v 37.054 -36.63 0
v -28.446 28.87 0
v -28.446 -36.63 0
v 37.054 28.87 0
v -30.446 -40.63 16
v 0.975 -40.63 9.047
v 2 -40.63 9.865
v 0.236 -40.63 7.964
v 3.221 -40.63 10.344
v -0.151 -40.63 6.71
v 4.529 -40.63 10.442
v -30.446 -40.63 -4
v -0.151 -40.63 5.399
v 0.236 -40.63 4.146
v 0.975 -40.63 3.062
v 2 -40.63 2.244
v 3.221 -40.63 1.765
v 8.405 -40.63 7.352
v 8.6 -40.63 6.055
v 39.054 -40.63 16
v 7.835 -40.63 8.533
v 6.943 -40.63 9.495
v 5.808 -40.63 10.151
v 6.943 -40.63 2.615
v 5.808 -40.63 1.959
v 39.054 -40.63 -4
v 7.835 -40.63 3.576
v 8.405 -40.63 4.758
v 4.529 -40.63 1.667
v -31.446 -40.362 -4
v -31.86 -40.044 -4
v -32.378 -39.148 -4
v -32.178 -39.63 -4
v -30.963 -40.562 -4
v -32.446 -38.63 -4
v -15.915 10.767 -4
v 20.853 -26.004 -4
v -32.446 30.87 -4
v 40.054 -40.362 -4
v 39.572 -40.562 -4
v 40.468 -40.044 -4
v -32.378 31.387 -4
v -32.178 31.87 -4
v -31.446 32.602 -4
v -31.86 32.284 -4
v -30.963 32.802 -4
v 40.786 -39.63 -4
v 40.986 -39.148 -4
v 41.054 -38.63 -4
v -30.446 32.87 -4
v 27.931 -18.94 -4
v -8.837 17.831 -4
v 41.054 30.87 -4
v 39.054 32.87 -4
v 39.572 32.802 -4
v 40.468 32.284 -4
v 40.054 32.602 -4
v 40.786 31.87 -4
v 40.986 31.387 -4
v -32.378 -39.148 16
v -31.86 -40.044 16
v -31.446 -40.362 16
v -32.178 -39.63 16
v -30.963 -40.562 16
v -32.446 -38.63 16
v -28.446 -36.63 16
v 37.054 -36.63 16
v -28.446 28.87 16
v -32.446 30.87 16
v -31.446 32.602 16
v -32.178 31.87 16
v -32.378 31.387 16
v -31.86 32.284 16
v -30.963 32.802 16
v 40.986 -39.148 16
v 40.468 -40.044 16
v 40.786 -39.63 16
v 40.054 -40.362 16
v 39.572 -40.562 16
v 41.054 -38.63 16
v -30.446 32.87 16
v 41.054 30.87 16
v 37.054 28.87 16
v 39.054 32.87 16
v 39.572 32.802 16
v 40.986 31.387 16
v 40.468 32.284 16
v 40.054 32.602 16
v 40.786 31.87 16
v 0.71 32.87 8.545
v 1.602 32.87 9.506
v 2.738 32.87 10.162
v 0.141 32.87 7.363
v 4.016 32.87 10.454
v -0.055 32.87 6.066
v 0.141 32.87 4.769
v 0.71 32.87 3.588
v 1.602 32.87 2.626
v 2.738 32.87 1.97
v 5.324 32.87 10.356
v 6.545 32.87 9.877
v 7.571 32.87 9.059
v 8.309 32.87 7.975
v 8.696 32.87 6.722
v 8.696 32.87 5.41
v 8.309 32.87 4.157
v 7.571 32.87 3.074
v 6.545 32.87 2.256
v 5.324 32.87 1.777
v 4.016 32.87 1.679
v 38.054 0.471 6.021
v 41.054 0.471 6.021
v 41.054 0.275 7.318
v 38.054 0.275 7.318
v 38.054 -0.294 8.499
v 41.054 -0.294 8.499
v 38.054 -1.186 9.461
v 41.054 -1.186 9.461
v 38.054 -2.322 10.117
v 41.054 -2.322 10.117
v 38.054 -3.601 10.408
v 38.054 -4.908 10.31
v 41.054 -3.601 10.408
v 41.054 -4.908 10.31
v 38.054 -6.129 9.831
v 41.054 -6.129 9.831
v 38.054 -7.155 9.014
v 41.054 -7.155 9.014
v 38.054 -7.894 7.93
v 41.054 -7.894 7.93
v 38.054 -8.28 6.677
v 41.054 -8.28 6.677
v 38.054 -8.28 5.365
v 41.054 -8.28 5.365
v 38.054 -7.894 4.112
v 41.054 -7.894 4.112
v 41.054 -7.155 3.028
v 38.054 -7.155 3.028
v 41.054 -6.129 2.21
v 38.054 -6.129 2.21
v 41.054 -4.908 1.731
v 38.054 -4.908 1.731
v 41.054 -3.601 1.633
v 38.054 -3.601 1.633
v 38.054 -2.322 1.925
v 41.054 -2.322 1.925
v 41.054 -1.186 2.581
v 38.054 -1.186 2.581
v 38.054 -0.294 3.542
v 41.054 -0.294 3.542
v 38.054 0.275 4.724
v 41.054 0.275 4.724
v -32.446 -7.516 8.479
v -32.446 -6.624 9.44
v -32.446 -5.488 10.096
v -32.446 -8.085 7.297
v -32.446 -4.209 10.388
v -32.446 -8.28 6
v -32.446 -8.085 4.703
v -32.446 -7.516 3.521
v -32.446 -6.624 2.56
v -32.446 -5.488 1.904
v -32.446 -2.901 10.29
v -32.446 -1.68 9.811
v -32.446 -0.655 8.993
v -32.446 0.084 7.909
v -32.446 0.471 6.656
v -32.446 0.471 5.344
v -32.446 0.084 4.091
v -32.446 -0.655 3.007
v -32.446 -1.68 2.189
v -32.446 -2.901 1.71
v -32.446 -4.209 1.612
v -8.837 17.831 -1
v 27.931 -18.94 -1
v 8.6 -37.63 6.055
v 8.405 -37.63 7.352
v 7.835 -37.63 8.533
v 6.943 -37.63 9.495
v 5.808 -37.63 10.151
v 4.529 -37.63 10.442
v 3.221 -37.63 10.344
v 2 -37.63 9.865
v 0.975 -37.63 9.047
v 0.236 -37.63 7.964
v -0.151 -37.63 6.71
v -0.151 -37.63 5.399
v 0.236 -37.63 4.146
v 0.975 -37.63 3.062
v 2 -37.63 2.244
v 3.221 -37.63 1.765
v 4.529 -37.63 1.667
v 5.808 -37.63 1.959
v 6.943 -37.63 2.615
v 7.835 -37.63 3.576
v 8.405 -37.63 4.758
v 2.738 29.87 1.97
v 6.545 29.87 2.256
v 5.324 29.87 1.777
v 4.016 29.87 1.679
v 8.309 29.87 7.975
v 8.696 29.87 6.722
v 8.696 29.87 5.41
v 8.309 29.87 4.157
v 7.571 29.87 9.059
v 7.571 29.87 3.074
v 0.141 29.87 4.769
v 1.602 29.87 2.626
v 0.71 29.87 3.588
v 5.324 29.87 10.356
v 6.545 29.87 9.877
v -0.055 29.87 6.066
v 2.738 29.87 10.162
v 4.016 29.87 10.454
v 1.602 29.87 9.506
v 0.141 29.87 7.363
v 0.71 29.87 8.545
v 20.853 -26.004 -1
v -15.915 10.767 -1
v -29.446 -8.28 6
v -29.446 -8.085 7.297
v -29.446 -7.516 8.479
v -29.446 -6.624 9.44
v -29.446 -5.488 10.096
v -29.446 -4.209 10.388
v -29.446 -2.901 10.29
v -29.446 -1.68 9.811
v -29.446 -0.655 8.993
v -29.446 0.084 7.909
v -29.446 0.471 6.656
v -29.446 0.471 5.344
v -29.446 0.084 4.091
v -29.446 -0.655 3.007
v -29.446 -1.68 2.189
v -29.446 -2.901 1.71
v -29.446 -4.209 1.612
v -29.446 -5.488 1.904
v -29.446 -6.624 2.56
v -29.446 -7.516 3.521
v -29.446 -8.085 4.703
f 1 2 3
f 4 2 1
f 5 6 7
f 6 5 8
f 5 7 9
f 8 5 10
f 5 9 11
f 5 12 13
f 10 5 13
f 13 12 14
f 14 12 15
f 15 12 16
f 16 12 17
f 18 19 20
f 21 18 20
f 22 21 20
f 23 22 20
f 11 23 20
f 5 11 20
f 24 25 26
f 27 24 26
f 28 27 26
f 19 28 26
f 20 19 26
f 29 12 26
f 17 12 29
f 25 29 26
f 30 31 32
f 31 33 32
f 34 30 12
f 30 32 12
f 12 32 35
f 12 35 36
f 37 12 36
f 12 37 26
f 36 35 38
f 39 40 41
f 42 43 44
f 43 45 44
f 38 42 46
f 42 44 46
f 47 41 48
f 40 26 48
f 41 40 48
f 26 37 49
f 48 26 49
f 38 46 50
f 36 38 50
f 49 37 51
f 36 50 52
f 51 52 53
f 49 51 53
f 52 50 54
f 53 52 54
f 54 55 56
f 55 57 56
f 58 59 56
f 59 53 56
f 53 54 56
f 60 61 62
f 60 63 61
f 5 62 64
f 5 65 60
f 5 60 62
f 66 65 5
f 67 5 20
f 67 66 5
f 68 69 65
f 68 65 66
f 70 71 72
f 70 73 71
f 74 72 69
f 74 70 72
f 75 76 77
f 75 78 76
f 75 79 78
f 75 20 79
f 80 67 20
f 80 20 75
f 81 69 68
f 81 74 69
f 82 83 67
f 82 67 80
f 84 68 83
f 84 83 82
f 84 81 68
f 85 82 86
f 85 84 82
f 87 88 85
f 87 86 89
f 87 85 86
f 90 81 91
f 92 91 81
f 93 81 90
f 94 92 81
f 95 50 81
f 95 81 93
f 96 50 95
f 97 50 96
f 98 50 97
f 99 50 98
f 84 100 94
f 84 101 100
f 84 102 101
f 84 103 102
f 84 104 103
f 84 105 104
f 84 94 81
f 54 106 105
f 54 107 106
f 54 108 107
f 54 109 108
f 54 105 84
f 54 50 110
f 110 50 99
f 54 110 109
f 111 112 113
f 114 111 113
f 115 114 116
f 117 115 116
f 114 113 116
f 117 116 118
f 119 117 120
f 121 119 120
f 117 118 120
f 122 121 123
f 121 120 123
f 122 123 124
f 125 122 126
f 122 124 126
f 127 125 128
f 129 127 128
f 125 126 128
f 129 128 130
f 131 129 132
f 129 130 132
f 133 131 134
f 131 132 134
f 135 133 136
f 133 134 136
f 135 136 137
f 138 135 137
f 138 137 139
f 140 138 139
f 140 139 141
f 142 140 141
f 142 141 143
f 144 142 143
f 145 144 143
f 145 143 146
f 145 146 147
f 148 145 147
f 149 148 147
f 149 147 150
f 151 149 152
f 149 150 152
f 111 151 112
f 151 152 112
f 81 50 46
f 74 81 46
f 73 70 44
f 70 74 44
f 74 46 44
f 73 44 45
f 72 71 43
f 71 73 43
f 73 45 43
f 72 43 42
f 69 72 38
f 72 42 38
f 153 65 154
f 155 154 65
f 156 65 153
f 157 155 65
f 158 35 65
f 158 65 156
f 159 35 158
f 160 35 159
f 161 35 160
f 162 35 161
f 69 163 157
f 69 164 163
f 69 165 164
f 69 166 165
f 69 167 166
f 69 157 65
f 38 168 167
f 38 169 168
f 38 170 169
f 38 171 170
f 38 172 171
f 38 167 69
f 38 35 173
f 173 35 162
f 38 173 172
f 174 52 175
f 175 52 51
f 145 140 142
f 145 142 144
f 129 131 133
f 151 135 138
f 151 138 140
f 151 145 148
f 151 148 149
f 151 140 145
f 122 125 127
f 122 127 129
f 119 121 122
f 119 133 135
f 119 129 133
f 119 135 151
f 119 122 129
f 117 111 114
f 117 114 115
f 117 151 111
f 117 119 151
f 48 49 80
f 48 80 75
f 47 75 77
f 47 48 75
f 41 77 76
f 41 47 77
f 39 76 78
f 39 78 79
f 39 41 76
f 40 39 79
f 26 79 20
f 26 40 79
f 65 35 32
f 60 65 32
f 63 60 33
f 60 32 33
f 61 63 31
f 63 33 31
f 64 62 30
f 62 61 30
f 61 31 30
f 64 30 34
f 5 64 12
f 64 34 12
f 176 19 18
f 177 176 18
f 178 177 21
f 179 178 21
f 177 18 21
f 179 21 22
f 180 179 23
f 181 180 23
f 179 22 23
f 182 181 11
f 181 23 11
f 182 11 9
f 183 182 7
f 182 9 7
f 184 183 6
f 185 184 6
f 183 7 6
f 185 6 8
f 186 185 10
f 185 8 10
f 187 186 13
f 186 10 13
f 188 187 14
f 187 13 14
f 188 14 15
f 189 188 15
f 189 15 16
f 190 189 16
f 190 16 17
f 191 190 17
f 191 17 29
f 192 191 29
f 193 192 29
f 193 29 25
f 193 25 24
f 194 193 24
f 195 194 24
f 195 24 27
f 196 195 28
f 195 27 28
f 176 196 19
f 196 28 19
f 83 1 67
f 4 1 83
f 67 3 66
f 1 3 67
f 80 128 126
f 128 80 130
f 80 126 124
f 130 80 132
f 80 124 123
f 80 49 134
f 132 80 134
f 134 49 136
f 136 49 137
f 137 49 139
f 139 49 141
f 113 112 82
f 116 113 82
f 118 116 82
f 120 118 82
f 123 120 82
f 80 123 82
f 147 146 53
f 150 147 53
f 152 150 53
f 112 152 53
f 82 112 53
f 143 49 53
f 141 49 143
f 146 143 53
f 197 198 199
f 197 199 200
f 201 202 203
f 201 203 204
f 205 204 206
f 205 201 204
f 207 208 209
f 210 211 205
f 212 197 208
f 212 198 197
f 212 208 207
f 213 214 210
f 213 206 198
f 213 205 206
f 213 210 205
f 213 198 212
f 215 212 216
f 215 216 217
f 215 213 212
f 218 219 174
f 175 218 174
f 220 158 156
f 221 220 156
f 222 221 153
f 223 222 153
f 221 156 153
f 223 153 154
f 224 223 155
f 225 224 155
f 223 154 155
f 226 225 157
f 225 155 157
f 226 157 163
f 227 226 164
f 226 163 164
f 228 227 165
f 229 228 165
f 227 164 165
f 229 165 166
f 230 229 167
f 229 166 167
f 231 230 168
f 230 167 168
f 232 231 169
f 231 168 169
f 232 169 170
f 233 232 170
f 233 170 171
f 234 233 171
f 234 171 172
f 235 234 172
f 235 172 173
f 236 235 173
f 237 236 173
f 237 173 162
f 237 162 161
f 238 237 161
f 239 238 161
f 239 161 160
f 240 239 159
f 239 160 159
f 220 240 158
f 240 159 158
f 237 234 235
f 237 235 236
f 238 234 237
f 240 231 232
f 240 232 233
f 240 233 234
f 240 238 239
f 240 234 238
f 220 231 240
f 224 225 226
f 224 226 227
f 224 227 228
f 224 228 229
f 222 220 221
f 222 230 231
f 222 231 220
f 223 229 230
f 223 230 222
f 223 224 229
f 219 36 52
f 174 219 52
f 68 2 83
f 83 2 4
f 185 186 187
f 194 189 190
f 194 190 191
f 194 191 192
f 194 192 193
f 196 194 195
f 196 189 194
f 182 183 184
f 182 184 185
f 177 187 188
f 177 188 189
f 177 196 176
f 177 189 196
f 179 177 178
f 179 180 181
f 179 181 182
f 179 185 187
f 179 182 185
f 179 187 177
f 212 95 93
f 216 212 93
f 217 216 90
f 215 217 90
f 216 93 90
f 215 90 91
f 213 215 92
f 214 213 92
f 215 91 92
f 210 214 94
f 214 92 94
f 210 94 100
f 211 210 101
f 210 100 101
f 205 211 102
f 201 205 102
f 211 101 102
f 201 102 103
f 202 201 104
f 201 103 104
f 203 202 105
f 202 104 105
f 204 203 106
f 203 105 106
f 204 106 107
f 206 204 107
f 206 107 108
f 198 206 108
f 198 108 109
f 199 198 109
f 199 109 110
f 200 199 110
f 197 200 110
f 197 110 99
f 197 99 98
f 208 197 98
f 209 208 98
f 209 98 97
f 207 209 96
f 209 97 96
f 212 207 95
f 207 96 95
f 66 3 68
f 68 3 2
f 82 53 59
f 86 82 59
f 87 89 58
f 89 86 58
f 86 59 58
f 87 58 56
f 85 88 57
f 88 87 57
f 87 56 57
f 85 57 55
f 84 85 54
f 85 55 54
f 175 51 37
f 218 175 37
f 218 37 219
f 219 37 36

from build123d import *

# Parameters (mm, degrees)
F0_W        = 65.5
F0_H        = 65.5
F1_DEPTH    = 16
F2_T        = 4
F3_T1_DEPTH = 30
F4_R        = 4.4
F8_DEPTH    = 3
F9_DEPTH    = 3
F5_R        = 4.4
F10_DEPTH   = 3
F6_R        = 4.4
F11_DEPTH   = 3
F7_R        = 4.4
F12_DEPTH   = 3
F14_DEPTH   = 3


# Not quite as in the source:
# - a fillet or chamfer that OpenCascade refuses, or shapes differently, is made with other operations: its cross-section is extruded or revolved along the edge and cut away or added


with BuildPart() as f1:
    # F0 (on Top) → F1 (new body)
    with BuildSketch(Plane.XY):
        with Locations((4.3041806072, -3.8802318871)):
            Rectangle(F0_W, F0_H)
    extrude(amount=F1_DEPTH)

    # F2
    f2_openings = [f1.faces().sort_by_distance(p)[0] for p in [
        (4.304181, -3.880232, 16),
    ]]
    offset(amount=F2_T, openings=f2_openings, kind=Kind.INTERSECTION)

    # F3: fillet of radius 2 on 4 edges, made by hand

    # F3_s2 → F3_t1 (cut)
    with BuildSketch(Plane.XY.offset(-9)):
        with BuildLine():
            ThreePointArc((41.0541806072, -38.6302318871), (40.4683941696, -40.0444454495), (39.0541806072, -40.6302318871))
            Line((39.0541806072, -40.6302318871), (41.0541806072, -40.6302318871))
            Line((41.0541806072, -40.6302318871), (41.0541806072, -38.6302318871))
        make_face()
        with BuildLine():
            ThreePointArc((41.0541806072, 30.8697681129), (40.4683941696, 32.2839816753), (39.0541806072, 32.8697681129))
            Line((39.0541806072, 32.8697681129), (41.0541806072, 32.8697681129))
            Line((41.0541806072, 32.8697681129), (41.0541806072, 30.8697681129))
        make_face()
        with BuildLine():
            ThreePointArc((-30.4458193928, 32.8697681129), (-31.8600329552, 32.2839816753), (-32.4458193928, 30.8697681129))
            Line((-32.4458193928, 30.8697681129), (-32.4458193928, 32.8697681129))
            Line((-32.4458193928, 32.8697681129), (-30.4458193928, 32.8697681129))
        make_face()
        with BuildLine():
            ThreePointArc((-32.4458193928, -38.6302318871), (-31.8600329552, -40.0444454495), (-30.4458193928, -40.6302318871))
            Line((-30.4458193928, -40.6302318871), (-32.4458193928, -40.6302318871))
            Line((-32.4458193928, -40.6302318871), (-32.4458193928, -38.6302318871))
        make_face()
    extrude(amount=F3_T1_DEPTH, mode=Mode.SUBTRACT)

    # F4 (on face) → F8 (join)
    with BuildSketch(Plane(origin=(-32.4458193928, 0, 0), x_dir=(0, -1, 0), z_dir=(-1, 0, 0))):
        with Locations((3.8802318871, 6)):
            Circle(F4_R)
    extrude(amount=-F8_DEPTH)

    # F4 (on face) → F9 (cut)
    with BuildSketch(Plane(origin=(-32.4458193928, 0, 0), x_dir=(0, -1, 0), z_dir=(-1, 0, 0))):
        with Locations((3.8802318871, 6)):
            Circle(F4_R)
    extrude(amount=-F9_DEPTH, mode=Mode.SUBTRACT)

    # F5 (on face) → F10 (cut)
    with BuildSketch(Plane.XZ.offset(40.6302318871)):
        with Locations((4.2000180173, 6.0547004089)):
            Circle(F5_R)
    extrude(amount=-F10_DEPTH, mode=Mode.SUBTRACT)

    # F6 (on face) → F11 (cut)
    with BuildSketch(Plane.YZ.offset(41.0541806072)):
        with Locations((-3.9293510383, 6.0207889489)):
            Circle(F6_R)
    extrude(amount=-F11_DEPTH, mode=Mode.SUBTRACT)

    # F7 (on face) → F12 (cut)
    with BuildSketch(Plane(origin=(0, 32.8697681129, 0), x_dir=(-1, 0, 0), z_dir=(0, 1, 0))):
        with Locations((-4.345219037, 6.0662772571)):
            Circle(F7_R)
    extrude(amount=-F12_DEPTH, mode=Mode.SUBTRACT)

    # F13 (on face) → F14 (cut)
    with BuildSketch(Plane(origin=(0, 0, -4), x_dir=(1, 0, 0), z_dir=(0, 0, -1))):
        Polygon((27.9313208005, 18.9403499991), (20.8531849213, 26.0043426715), (-15.9149708404, -10.7666407574), (-8.8368349613, -17.8306334298), align=None)
    extrude(amount=-F14_DEPTH, mode=Mode.SUBTRACT)


solid = f1.part
